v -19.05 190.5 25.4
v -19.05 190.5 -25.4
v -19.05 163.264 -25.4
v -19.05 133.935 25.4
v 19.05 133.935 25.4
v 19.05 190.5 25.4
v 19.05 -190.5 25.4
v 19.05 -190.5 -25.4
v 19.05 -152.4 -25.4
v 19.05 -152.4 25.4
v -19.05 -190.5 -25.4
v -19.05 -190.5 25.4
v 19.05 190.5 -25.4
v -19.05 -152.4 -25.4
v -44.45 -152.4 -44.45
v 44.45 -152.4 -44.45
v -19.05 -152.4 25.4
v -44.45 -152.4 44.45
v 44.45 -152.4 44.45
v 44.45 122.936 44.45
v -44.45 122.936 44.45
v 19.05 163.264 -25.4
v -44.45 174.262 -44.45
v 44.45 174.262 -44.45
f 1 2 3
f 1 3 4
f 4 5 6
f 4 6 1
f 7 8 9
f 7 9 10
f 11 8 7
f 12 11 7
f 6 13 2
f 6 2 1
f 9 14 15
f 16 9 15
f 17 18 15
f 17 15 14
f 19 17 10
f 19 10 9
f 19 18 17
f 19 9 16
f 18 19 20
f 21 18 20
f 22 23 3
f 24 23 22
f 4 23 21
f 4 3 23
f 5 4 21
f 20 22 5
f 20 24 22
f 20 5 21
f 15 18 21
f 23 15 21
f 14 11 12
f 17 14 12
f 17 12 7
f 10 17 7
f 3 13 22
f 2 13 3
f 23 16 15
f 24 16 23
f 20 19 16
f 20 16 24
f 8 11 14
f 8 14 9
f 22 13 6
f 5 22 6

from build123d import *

# Parameters (mm, degrees)
F0_W     = 381
F0_H     = 88.9
F1_DEPTH = 44.45
F4_W     = 88.9
F4_H     = 88.9
F4_W_2   = 38.1
F4_H_2   = 50.8
F5_REACH = 193.287585695
F6_W     = 88.9
F6_H     = 88.9
F6_W_2   = 38.1
F6_H_2   = 50.8
F7_DEPTH = 38.1


with BuildPart() as f1:
    # F0 (on Right) → F1 (new body, symmetric)
    with BuildSketch(Plane.YZ):
        Rectangle(F0_W, F0_H)
    extrude(amount=F1_DEPTH, both=True)

    f5_end = Plane(origin=(0, 111.4494145991, 64.3453495198), x_dir=(0, -0.5, 0.8660254038), z_dir=(0, 0.8660254038, 0.5))
    # F4 (on face) → F5 (cut, up to a plane its end follows)
    with BuildSketch(Plane(origin=(0, 190.5, 0), x_dir=(-1, 0, 0), z_dir=(0, 1, 0))):
        Rectangle(F4_W, F4_H)
        Rectangle(F4_W_2, F4_H_2, mode=Mode.SUBTRACT)
    f5_long = extrude(amount=-F5_REACH, mode=Mode.PRIVATE)
    add(split(f5_long, bisect_by=f5_end, keep=Keep.TOP, mode=Mode.PRIVATE), mode=Mode.SUBTRACT)

    # F6 (on face) → F7 (cut)
    with BuildSketch(Plane.XZ.offset(190.5)):
        Rectangle(F6_W, F6_H)
        Rectangle(F6_W_2, F6_H_2, mode=Mode.SUBTRACT)
    extrude(amount=-F7_DEPTH, mode=Mode.SUBTRACT)


solid = f1.part
